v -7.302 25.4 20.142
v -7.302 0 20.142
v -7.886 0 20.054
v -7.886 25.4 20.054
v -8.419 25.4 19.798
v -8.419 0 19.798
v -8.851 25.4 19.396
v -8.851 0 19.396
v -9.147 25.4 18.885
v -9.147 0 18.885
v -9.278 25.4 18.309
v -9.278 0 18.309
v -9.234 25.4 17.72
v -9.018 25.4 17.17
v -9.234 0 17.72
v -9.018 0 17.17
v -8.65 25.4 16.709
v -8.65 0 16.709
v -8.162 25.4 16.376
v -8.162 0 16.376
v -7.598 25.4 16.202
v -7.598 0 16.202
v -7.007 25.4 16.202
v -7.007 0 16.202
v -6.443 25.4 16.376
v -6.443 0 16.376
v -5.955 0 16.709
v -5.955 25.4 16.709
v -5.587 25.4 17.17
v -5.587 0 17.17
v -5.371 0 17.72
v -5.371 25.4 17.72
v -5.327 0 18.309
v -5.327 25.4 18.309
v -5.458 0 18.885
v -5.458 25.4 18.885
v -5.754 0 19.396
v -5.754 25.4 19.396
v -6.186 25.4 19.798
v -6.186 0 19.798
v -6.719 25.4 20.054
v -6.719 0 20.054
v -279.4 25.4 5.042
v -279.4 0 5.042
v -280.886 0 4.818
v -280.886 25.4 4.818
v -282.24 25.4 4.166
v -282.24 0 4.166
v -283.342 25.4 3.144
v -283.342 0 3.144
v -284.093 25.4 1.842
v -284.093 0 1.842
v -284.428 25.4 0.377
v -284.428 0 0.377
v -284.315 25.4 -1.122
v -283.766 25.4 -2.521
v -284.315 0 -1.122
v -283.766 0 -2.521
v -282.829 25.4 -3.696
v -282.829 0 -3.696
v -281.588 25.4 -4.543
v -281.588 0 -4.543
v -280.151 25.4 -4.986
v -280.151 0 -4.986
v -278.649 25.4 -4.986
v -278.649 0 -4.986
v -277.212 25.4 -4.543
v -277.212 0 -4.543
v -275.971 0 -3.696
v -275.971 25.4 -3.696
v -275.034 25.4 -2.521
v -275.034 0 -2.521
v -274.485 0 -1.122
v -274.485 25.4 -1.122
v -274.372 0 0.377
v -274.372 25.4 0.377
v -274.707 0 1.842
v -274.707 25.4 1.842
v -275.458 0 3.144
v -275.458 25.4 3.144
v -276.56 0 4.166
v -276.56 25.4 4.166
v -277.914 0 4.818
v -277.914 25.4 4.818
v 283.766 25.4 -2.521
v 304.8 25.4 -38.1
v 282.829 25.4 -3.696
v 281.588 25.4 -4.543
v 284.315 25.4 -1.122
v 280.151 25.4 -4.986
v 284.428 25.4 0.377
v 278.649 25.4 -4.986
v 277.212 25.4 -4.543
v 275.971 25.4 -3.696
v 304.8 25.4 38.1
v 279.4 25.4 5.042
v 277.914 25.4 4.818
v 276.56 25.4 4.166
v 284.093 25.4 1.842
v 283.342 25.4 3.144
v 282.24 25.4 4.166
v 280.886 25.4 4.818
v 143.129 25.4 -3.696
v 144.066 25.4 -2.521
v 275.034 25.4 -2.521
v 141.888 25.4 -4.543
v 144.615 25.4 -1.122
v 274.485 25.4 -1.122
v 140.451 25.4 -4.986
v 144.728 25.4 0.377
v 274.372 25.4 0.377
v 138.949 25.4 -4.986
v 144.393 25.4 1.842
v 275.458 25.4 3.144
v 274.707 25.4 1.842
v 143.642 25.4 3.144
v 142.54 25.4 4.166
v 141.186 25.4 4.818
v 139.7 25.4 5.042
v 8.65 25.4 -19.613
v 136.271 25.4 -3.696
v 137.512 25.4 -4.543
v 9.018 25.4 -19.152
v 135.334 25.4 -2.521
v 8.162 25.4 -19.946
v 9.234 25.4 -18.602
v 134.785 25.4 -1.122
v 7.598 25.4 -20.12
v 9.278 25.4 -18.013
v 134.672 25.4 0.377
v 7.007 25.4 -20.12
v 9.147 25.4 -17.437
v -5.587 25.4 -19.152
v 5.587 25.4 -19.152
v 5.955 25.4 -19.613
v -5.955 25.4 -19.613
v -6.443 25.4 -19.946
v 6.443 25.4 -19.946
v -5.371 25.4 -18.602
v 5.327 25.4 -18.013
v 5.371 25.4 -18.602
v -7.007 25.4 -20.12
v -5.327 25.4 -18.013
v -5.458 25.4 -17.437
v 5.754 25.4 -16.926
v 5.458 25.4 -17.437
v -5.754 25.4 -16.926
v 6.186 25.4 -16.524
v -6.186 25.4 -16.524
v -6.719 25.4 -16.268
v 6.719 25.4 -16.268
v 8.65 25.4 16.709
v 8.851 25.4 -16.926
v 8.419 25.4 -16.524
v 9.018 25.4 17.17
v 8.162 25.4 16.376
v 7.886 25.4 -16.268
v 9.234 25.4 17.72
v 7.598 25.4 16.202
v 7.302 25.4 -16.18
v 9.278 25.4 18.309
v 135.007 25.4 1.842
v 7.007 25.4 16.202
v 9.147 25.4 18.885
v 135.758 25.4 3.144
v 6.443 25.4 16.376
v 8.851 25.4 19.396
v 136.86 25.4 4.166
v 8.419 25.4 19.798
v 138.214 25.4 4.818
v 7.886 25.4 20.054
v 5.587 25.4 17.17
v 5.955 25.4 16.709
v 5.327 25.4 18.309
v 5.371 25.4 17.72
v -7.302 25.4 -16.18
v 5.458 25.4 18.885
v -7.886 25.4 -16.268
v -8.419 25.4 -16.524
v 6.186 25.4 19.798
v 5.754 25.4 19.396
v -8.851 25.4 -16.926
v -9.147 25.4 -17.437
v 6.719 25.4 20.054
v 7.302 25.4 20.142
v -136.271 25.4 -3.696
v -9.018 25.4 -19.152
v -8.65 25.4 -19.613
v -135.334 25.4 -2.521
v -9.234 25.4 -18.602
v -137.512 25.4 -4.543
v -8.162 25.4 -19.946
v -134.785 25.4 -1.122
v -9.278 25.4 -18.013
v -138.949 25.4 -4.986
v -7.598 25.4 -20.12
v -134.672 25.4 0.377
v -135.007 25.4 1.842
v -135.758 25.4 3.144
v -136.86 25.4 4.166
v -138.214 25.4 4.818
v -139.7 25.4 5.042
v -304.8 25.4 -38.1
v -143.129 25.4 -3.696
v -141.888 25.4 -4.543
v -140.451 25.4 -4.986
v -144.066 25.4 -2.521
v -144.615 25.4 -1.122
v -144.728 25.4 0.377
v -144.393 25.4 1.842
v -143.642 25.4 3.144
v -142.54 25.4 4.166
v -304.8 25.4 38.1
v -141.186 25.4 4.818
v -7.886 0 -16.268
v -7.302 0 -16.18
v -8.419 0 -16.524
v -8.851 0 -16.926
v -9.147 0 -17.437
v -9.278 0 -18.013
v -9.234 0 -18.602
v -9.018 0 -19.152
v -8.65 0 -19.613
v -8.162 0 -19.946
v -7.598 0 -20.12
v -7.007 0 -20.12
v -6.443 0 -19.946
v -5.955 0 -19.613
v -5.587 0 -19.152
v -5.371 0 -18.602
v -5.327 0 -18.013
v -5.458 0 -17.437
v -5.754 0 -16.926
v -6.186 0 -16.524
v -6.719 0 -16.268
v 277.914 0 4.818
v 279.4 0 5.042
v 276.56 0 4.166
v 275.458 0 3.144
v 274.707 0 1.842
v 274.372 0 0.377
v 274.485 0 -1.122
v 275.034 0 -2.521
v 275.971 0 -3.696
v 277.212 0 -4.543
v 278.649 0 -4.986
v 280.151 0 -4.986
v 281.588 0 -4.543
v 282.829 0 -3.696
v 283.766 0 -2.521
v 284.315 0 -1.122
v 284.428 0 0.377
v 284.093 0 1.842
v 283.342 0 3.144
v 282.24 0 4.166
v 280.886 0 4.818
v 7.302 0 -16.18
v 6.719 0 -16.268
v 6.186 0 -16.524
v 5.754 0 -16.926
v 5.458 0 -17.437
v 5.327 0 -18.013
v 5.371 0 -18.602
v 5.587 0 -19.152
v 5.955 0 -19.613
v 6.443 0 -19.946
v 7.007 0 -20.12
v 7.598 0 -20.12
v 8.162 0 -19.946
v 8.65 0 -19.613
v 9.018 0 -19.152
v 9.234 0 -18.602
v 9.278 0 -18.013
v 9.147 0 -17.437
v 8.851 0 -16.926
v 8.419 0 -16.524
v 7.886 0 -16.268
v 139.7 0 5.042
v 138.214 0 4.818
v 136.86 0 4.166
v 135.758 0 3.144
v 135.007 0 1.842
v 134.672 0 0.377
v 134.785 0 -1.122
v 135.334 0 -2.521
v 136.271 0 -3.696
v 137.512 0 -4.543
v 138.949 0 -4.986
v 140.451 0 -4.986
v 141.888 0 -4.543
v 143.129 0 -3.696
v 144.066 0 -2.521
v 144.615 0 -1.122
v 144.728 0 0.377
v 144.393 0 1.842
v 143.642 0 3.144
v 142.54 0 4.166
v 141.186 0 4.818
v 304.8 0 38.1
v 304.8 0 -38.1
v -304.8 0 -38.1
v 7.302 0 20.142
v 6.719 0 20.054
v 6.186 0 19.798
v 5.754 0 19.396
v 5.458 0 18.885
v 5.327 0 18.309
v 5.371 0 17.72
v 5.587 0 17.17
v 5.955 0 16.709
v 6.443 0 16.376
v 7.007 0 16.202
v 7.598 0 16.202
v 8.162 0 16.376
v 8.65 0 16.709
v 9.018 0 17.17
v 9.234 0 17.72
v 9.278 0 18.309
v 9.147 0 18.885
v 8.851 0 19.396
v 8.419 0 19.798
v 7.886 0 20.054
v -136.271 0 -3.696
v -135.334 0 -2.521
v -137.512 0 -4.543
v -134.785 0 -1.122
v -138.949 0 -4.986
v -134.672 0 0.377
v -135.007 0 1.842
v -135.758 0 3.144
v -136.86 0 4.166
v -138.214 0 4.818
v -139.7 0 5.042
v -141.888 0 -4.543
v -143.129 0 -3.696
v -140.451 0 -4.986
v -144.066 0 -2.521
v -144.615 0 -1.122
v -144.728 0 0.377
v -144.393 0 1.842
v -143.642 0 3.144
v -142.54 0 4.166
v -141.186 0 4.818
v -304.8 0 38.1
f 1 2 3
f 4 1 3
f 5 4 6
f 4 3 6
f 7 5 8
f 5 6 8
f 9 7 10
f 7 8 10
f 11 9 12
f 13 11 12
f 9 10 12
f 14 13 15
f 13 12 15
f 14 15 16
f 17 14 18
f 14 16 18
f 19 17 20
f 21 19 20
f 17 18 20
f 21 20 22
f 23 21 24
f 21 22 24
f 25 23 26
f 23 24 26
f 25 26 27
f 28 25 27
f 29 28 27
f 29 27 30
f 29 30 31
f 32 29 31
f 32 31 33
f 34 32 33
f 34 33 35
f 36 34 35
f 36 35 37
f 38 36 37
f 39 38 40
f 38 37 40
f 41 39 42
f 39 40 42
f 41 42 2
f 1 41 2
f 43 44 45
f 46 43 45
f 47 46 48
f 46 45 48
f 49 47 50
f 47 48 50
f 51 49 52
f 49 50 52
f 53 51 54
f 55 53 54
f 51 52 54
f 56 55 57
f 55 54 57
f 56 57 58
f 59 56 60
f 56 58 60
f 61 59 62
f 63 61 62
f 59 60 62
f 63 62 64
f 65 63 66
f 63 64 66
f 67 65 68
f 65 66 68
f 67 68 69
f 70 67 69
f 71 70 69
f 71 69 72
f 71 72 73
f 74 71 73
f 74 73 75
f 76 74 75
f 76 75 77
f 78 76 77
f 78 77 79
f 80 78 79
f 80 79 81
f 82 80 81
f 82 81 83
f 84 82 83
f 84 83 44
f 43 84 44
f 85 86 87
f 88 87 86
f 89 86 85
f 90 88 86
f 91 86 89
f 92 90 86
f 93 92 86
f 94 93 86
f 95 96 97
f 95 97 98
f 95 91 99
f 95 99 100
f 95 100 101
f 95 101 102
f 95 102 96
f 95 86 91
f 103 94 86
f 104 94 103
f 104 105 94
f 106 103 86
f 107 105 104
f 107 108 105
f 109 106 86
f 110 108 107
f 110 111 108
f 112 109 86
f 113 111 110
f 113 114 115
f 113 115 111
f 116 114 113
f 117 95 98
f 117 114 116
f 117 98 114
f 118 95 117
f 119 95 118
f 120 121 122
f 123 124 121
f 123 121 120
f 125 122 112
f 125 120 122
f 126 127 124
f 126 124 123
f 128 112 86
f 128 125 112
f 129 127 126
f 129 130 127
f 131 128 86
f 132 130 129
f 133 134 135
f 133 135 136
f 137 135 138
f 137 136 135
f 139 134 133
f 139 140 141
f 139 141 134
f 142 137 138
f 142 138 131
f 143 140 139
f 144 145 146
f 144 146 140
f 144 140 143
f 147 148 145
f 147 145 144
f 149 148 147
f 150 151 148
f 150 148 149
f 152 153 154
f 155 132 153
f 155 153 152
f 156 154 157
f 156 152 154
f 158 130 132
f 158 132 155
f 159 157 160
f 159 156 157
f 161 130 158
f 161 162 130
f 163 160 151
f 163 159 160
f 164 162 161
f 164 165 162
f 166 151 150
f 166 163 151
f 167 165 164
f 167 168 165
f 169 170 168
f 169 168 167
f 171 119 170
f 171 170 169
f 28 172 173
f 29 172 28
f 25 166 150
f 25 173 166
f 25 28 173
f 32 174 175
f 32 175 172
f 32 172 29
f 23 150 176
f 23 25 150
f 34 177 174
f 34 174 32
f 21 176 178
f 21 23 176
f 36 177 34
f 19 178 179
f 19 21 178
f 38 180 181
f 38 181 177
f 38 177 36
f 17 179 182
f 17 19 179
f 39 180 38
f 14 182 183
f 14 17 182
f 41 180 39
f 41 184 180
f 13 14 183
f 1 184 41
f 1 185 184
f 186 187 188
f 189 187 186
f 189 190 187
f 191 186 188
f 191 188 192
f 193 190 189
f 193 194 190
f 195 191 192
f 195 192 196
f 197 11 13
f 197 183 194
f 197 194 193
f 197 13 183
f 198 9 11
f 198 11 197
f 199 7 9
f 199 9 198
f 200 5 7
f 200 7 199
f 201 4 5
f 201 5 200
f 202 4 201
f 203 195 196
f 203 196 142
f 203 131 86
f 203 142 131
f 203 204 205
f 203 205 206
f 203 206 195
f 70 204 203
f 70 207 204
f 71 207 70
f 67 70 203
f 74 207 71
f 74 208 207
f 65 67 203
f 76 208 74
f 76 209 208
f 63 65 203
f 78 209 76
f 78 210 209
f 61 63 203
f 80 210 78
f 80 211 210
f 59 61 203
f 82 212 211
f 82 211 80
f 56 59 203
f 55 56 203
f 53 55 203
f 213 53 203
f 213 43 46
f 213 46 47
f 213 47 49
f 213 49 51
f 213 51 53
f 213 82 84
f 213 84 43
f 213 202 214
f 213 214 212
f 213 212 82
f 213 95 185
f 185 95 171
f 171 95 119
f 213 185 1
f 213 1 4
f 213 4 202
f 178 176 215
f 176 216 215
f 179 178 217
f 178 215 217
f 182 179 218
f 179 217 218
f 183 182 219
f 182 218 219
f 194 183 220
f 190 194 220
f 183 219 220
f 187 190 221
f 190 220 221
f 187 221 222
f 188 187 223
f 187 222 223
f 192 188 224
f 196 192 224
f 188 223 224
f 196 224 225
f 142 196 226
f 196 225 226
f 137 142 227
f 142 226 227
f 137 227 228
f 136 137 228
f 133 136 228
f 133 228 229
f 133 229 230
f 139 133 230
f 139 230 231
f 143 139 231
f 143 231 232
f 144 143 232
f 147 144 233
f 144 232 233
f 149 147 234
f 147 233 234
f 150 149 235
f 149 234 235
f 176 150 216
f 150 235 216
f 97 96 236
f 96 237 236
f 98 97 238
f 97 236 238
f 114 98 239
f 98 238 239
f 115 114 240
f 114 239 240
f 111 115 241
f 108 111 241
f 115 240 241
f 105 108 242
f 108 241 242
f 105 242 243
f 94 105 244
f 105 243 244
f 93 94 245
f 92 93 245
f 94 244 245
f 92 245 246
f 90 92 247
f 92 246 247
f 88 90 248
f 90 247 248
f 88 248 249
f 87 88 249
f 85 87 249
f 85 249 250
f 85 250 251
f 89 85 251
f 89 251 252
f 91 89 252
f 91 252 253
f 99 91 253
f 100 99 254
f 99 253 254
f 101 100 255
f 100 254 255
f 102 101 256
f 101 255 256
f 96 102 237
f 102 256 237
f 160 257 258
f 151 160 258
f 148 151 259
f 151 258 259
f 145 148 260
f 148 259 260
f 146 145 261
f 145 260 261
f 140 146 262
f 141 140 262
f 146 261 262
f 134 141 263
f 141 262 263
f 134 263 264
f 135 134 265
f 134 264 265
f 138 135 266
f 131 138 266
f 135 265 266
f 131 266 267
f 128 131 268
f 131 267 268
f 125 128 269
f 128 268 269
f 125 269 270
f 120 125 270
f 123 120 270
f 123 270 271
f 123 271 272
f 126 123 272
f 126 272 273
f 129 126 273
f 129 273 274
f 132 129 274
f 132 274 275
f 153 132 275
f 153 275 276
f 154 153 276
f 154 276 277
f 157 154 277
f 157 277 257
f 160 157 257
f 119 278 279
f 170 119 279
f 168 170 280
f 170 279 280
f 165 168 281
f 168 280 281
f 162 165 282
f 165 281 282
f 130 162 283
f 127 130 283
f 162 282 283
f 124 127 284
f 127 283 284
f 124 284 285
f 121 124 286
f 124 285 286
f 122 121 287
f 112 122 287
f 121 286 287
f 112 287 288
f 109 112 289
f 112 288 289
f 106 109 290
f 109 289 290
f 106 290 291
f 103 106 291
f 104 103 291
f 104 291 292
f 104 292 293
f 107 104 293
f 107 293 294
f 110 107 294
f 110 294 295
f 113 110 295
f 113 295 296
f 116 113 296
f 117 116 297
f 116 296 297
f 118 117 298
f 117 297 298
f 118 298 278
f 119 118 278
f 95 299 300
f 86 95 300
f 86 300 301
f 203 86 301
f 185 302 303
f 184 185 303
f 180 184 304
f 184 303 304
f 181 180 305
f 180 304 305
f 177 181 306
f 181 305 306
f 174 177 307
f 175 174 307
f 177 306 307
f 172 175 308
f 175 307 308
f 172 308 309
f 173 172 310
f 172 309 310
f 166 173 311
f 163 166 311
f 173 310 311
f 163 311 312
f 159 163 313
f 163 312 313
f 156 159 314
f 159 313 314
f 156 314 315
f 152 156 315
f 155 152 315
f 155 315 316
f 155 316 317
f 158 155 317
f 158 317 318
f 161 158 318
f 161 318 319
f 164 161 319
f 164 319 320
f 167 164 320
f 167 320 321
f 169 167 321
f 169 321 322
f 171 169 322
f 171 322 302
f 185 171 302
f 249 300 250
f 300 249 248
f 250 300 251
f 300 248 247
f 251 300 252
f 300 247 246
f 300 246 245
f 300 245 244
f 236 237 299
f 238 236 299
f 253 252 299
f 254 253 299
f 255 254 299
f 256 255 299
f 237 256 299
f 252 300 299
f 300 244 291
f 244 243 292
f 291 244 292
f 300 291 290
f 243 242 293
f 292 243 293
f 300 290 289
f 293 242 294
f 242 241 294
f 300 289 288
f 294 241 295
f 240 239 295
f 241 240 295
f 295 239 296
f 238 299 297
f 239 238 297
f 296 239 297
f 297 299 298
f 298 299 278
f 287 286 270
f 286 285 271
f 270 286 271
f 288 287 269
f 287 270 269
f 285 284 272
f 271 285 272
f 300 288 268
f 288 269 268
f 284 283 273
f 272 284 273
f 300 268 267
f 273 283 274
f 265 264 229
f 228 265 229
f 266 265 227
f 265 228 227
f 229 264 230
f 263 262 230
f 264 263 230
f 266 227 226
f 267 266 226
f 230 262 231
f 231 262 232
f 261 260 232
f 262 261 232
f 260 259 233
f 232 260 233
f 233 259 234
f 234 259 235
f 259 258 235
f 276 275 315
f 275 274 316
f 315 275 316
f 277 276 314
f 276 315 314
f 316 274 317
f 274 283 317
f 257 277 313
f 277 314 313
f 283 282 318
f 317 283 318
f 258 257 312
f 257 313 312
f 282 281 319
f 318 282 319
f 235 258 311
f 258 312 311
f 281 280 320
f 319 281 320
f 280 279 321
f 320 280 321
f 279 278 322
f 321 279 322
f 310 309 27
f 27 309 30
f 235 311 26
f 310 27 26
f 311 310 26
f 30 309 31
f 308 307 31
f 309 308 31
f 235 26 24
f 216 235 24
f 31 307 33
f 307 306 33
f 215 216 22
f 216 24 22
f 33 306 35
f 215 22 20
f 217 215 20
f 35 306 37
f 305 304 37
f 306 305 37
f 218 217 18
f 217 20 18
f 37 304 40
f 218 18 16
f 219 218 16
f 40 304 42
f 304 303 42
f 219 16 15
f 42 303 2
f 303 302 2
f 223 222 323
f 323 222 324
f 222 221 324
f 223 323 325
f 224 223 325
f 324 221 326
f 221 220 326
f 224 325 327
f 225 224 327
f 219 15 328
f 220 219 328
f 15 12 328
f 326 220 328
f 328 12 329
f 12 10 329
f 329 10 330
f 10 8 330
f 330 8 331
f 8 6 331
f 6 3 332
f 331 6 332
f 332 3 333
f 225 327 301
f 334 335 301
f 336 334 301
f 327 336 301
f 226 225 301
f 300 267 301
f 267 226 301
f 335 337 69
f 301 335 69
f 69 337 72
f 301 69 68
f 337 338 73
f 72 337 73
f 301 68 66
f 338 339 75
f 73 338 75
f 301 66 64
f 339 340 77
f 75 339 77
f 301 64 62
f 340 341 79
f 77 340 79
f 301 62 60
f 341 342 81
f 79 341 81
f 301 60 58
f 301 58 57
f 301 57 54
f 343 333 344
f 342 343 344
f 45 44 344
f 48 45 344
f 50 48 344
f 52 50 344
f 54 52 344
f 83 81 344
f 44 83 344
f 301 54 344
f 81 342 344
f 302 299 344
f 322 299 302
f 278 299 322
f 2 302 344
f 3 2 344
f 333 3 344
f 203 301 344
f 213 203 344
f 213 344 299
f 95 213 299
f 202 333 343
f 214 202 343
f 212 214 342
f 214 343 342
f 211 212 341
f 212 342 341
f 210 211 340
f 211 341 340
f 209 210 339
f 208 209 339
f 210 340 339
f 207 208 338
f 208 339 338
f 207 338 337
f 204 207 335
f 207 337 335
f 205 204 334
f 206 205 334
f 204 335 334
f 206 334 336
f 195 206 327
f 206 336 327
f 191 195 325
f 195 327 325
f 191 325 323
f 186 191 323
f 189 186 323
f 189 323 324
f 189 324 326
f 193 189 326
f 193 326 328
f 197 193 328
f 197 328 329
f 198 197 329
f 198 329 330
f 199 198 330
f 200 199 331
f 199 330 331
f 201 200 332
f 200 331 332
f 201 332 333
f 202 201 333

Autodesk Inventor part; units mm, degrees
ref_plane "YZ Plane" through (0, 0, 0) normal (1, 0, 0) x (0, 1, 0)
ref_plane "XZ Plane" through (0, 0, 0) normal (0, 1, 0) x (-1, 0, 0)
ref_plane "XY Plane" through (0, 0, 0) normal (0, 0, 1) x (1, 0, 0)
sketch "Sketch1" plane through (0, 0, 0) normal (0, 1, 0) x (-1, 0, 0)
  line L0 (304.8, 38.1) -> (-304.8, 38.1)
  line L1 (-304.8, 38.1) -> (-304.8, -38.1)
  line L2 (-304.8, -38.1) -> (304.8, -38.1)
  line L3 (304.8, -38.1) -> (304.8, 38.1)
  line L4 (304.8, 38.1) -> (-304.8, -38.1) construction
  line L5 (-304.8, 38.1) -> (304.8, -38.1) construction
  point P0 (0, 0)
  dimension "d0" = 609.6
  dimension "d1" = 76.2
extrude "Extrusion1" add sketch "Sketch1" along normal blind 25.4
sketch "Sketch2" plane through (0, 25.4, 0) normal (0, 1, 0) x (1, 0, 0)
  line L0 (0, 0) -> (0, 46.0964) construction
  line L1 (0, 0) -> (279.4, 0) construction
  line L2 (0, 0) -> (139.7, 0) construction
  point P0 (-139.7, 0)
  point P1 (-279.4, 0)
  dimension "d4" = 279.4
  dimension "d5" = 139.7
hole "Hole1" at (139.7, 25.4, 0) at (279.4, 25.4, 0) at (-139.7, 25.4, 0) at (-279.4, 25.4, 0) direction (0, -1, 0) diameter 10.0838 end through all clearance for "Flat Head Machine Screw (82)" size "3/8" standard "Ansi Unified Screw Threads"
sketch "Sketch3" plane through (0, 25.4, 0) normal (0, 1, 0) x (1, 0, 0)
  line L0 (7.3025, 18.161) -> (-7.3025, 18.161) construction
  line L1 (-7.3025, 18.161) -> (-7.3025, -18.161) construction
  line L2 (-7.3025, -18.161) -> (7.3025, -18.161) construction
  line L3 (7.3025, -18.161) -> (7.3025, 18.161) construction
  line L4 (7.3025, 18.161) -> (-7.3025, -18.161) construction
  line L5 (-7.3025, 18.161) -> (7.3025, -18.161) construction
  point P0 (0, 0)
  dimension "d13" = 14.605
  dimension "d14" = 36.322
hole "Hole2" at (-7.3025, 25.4, -18.161) at (7.3025, 25.4, -18.161) at (7.3025, 25.4, 18.161) at (-7.3025, 25.4, 18.161) direction (0, -1, 0) diameter 3.9624 end through all thread size "10-32 UNF" class "2B" standard "ANSI Unified Screw Threads"
properties part number "table reinforcement"
